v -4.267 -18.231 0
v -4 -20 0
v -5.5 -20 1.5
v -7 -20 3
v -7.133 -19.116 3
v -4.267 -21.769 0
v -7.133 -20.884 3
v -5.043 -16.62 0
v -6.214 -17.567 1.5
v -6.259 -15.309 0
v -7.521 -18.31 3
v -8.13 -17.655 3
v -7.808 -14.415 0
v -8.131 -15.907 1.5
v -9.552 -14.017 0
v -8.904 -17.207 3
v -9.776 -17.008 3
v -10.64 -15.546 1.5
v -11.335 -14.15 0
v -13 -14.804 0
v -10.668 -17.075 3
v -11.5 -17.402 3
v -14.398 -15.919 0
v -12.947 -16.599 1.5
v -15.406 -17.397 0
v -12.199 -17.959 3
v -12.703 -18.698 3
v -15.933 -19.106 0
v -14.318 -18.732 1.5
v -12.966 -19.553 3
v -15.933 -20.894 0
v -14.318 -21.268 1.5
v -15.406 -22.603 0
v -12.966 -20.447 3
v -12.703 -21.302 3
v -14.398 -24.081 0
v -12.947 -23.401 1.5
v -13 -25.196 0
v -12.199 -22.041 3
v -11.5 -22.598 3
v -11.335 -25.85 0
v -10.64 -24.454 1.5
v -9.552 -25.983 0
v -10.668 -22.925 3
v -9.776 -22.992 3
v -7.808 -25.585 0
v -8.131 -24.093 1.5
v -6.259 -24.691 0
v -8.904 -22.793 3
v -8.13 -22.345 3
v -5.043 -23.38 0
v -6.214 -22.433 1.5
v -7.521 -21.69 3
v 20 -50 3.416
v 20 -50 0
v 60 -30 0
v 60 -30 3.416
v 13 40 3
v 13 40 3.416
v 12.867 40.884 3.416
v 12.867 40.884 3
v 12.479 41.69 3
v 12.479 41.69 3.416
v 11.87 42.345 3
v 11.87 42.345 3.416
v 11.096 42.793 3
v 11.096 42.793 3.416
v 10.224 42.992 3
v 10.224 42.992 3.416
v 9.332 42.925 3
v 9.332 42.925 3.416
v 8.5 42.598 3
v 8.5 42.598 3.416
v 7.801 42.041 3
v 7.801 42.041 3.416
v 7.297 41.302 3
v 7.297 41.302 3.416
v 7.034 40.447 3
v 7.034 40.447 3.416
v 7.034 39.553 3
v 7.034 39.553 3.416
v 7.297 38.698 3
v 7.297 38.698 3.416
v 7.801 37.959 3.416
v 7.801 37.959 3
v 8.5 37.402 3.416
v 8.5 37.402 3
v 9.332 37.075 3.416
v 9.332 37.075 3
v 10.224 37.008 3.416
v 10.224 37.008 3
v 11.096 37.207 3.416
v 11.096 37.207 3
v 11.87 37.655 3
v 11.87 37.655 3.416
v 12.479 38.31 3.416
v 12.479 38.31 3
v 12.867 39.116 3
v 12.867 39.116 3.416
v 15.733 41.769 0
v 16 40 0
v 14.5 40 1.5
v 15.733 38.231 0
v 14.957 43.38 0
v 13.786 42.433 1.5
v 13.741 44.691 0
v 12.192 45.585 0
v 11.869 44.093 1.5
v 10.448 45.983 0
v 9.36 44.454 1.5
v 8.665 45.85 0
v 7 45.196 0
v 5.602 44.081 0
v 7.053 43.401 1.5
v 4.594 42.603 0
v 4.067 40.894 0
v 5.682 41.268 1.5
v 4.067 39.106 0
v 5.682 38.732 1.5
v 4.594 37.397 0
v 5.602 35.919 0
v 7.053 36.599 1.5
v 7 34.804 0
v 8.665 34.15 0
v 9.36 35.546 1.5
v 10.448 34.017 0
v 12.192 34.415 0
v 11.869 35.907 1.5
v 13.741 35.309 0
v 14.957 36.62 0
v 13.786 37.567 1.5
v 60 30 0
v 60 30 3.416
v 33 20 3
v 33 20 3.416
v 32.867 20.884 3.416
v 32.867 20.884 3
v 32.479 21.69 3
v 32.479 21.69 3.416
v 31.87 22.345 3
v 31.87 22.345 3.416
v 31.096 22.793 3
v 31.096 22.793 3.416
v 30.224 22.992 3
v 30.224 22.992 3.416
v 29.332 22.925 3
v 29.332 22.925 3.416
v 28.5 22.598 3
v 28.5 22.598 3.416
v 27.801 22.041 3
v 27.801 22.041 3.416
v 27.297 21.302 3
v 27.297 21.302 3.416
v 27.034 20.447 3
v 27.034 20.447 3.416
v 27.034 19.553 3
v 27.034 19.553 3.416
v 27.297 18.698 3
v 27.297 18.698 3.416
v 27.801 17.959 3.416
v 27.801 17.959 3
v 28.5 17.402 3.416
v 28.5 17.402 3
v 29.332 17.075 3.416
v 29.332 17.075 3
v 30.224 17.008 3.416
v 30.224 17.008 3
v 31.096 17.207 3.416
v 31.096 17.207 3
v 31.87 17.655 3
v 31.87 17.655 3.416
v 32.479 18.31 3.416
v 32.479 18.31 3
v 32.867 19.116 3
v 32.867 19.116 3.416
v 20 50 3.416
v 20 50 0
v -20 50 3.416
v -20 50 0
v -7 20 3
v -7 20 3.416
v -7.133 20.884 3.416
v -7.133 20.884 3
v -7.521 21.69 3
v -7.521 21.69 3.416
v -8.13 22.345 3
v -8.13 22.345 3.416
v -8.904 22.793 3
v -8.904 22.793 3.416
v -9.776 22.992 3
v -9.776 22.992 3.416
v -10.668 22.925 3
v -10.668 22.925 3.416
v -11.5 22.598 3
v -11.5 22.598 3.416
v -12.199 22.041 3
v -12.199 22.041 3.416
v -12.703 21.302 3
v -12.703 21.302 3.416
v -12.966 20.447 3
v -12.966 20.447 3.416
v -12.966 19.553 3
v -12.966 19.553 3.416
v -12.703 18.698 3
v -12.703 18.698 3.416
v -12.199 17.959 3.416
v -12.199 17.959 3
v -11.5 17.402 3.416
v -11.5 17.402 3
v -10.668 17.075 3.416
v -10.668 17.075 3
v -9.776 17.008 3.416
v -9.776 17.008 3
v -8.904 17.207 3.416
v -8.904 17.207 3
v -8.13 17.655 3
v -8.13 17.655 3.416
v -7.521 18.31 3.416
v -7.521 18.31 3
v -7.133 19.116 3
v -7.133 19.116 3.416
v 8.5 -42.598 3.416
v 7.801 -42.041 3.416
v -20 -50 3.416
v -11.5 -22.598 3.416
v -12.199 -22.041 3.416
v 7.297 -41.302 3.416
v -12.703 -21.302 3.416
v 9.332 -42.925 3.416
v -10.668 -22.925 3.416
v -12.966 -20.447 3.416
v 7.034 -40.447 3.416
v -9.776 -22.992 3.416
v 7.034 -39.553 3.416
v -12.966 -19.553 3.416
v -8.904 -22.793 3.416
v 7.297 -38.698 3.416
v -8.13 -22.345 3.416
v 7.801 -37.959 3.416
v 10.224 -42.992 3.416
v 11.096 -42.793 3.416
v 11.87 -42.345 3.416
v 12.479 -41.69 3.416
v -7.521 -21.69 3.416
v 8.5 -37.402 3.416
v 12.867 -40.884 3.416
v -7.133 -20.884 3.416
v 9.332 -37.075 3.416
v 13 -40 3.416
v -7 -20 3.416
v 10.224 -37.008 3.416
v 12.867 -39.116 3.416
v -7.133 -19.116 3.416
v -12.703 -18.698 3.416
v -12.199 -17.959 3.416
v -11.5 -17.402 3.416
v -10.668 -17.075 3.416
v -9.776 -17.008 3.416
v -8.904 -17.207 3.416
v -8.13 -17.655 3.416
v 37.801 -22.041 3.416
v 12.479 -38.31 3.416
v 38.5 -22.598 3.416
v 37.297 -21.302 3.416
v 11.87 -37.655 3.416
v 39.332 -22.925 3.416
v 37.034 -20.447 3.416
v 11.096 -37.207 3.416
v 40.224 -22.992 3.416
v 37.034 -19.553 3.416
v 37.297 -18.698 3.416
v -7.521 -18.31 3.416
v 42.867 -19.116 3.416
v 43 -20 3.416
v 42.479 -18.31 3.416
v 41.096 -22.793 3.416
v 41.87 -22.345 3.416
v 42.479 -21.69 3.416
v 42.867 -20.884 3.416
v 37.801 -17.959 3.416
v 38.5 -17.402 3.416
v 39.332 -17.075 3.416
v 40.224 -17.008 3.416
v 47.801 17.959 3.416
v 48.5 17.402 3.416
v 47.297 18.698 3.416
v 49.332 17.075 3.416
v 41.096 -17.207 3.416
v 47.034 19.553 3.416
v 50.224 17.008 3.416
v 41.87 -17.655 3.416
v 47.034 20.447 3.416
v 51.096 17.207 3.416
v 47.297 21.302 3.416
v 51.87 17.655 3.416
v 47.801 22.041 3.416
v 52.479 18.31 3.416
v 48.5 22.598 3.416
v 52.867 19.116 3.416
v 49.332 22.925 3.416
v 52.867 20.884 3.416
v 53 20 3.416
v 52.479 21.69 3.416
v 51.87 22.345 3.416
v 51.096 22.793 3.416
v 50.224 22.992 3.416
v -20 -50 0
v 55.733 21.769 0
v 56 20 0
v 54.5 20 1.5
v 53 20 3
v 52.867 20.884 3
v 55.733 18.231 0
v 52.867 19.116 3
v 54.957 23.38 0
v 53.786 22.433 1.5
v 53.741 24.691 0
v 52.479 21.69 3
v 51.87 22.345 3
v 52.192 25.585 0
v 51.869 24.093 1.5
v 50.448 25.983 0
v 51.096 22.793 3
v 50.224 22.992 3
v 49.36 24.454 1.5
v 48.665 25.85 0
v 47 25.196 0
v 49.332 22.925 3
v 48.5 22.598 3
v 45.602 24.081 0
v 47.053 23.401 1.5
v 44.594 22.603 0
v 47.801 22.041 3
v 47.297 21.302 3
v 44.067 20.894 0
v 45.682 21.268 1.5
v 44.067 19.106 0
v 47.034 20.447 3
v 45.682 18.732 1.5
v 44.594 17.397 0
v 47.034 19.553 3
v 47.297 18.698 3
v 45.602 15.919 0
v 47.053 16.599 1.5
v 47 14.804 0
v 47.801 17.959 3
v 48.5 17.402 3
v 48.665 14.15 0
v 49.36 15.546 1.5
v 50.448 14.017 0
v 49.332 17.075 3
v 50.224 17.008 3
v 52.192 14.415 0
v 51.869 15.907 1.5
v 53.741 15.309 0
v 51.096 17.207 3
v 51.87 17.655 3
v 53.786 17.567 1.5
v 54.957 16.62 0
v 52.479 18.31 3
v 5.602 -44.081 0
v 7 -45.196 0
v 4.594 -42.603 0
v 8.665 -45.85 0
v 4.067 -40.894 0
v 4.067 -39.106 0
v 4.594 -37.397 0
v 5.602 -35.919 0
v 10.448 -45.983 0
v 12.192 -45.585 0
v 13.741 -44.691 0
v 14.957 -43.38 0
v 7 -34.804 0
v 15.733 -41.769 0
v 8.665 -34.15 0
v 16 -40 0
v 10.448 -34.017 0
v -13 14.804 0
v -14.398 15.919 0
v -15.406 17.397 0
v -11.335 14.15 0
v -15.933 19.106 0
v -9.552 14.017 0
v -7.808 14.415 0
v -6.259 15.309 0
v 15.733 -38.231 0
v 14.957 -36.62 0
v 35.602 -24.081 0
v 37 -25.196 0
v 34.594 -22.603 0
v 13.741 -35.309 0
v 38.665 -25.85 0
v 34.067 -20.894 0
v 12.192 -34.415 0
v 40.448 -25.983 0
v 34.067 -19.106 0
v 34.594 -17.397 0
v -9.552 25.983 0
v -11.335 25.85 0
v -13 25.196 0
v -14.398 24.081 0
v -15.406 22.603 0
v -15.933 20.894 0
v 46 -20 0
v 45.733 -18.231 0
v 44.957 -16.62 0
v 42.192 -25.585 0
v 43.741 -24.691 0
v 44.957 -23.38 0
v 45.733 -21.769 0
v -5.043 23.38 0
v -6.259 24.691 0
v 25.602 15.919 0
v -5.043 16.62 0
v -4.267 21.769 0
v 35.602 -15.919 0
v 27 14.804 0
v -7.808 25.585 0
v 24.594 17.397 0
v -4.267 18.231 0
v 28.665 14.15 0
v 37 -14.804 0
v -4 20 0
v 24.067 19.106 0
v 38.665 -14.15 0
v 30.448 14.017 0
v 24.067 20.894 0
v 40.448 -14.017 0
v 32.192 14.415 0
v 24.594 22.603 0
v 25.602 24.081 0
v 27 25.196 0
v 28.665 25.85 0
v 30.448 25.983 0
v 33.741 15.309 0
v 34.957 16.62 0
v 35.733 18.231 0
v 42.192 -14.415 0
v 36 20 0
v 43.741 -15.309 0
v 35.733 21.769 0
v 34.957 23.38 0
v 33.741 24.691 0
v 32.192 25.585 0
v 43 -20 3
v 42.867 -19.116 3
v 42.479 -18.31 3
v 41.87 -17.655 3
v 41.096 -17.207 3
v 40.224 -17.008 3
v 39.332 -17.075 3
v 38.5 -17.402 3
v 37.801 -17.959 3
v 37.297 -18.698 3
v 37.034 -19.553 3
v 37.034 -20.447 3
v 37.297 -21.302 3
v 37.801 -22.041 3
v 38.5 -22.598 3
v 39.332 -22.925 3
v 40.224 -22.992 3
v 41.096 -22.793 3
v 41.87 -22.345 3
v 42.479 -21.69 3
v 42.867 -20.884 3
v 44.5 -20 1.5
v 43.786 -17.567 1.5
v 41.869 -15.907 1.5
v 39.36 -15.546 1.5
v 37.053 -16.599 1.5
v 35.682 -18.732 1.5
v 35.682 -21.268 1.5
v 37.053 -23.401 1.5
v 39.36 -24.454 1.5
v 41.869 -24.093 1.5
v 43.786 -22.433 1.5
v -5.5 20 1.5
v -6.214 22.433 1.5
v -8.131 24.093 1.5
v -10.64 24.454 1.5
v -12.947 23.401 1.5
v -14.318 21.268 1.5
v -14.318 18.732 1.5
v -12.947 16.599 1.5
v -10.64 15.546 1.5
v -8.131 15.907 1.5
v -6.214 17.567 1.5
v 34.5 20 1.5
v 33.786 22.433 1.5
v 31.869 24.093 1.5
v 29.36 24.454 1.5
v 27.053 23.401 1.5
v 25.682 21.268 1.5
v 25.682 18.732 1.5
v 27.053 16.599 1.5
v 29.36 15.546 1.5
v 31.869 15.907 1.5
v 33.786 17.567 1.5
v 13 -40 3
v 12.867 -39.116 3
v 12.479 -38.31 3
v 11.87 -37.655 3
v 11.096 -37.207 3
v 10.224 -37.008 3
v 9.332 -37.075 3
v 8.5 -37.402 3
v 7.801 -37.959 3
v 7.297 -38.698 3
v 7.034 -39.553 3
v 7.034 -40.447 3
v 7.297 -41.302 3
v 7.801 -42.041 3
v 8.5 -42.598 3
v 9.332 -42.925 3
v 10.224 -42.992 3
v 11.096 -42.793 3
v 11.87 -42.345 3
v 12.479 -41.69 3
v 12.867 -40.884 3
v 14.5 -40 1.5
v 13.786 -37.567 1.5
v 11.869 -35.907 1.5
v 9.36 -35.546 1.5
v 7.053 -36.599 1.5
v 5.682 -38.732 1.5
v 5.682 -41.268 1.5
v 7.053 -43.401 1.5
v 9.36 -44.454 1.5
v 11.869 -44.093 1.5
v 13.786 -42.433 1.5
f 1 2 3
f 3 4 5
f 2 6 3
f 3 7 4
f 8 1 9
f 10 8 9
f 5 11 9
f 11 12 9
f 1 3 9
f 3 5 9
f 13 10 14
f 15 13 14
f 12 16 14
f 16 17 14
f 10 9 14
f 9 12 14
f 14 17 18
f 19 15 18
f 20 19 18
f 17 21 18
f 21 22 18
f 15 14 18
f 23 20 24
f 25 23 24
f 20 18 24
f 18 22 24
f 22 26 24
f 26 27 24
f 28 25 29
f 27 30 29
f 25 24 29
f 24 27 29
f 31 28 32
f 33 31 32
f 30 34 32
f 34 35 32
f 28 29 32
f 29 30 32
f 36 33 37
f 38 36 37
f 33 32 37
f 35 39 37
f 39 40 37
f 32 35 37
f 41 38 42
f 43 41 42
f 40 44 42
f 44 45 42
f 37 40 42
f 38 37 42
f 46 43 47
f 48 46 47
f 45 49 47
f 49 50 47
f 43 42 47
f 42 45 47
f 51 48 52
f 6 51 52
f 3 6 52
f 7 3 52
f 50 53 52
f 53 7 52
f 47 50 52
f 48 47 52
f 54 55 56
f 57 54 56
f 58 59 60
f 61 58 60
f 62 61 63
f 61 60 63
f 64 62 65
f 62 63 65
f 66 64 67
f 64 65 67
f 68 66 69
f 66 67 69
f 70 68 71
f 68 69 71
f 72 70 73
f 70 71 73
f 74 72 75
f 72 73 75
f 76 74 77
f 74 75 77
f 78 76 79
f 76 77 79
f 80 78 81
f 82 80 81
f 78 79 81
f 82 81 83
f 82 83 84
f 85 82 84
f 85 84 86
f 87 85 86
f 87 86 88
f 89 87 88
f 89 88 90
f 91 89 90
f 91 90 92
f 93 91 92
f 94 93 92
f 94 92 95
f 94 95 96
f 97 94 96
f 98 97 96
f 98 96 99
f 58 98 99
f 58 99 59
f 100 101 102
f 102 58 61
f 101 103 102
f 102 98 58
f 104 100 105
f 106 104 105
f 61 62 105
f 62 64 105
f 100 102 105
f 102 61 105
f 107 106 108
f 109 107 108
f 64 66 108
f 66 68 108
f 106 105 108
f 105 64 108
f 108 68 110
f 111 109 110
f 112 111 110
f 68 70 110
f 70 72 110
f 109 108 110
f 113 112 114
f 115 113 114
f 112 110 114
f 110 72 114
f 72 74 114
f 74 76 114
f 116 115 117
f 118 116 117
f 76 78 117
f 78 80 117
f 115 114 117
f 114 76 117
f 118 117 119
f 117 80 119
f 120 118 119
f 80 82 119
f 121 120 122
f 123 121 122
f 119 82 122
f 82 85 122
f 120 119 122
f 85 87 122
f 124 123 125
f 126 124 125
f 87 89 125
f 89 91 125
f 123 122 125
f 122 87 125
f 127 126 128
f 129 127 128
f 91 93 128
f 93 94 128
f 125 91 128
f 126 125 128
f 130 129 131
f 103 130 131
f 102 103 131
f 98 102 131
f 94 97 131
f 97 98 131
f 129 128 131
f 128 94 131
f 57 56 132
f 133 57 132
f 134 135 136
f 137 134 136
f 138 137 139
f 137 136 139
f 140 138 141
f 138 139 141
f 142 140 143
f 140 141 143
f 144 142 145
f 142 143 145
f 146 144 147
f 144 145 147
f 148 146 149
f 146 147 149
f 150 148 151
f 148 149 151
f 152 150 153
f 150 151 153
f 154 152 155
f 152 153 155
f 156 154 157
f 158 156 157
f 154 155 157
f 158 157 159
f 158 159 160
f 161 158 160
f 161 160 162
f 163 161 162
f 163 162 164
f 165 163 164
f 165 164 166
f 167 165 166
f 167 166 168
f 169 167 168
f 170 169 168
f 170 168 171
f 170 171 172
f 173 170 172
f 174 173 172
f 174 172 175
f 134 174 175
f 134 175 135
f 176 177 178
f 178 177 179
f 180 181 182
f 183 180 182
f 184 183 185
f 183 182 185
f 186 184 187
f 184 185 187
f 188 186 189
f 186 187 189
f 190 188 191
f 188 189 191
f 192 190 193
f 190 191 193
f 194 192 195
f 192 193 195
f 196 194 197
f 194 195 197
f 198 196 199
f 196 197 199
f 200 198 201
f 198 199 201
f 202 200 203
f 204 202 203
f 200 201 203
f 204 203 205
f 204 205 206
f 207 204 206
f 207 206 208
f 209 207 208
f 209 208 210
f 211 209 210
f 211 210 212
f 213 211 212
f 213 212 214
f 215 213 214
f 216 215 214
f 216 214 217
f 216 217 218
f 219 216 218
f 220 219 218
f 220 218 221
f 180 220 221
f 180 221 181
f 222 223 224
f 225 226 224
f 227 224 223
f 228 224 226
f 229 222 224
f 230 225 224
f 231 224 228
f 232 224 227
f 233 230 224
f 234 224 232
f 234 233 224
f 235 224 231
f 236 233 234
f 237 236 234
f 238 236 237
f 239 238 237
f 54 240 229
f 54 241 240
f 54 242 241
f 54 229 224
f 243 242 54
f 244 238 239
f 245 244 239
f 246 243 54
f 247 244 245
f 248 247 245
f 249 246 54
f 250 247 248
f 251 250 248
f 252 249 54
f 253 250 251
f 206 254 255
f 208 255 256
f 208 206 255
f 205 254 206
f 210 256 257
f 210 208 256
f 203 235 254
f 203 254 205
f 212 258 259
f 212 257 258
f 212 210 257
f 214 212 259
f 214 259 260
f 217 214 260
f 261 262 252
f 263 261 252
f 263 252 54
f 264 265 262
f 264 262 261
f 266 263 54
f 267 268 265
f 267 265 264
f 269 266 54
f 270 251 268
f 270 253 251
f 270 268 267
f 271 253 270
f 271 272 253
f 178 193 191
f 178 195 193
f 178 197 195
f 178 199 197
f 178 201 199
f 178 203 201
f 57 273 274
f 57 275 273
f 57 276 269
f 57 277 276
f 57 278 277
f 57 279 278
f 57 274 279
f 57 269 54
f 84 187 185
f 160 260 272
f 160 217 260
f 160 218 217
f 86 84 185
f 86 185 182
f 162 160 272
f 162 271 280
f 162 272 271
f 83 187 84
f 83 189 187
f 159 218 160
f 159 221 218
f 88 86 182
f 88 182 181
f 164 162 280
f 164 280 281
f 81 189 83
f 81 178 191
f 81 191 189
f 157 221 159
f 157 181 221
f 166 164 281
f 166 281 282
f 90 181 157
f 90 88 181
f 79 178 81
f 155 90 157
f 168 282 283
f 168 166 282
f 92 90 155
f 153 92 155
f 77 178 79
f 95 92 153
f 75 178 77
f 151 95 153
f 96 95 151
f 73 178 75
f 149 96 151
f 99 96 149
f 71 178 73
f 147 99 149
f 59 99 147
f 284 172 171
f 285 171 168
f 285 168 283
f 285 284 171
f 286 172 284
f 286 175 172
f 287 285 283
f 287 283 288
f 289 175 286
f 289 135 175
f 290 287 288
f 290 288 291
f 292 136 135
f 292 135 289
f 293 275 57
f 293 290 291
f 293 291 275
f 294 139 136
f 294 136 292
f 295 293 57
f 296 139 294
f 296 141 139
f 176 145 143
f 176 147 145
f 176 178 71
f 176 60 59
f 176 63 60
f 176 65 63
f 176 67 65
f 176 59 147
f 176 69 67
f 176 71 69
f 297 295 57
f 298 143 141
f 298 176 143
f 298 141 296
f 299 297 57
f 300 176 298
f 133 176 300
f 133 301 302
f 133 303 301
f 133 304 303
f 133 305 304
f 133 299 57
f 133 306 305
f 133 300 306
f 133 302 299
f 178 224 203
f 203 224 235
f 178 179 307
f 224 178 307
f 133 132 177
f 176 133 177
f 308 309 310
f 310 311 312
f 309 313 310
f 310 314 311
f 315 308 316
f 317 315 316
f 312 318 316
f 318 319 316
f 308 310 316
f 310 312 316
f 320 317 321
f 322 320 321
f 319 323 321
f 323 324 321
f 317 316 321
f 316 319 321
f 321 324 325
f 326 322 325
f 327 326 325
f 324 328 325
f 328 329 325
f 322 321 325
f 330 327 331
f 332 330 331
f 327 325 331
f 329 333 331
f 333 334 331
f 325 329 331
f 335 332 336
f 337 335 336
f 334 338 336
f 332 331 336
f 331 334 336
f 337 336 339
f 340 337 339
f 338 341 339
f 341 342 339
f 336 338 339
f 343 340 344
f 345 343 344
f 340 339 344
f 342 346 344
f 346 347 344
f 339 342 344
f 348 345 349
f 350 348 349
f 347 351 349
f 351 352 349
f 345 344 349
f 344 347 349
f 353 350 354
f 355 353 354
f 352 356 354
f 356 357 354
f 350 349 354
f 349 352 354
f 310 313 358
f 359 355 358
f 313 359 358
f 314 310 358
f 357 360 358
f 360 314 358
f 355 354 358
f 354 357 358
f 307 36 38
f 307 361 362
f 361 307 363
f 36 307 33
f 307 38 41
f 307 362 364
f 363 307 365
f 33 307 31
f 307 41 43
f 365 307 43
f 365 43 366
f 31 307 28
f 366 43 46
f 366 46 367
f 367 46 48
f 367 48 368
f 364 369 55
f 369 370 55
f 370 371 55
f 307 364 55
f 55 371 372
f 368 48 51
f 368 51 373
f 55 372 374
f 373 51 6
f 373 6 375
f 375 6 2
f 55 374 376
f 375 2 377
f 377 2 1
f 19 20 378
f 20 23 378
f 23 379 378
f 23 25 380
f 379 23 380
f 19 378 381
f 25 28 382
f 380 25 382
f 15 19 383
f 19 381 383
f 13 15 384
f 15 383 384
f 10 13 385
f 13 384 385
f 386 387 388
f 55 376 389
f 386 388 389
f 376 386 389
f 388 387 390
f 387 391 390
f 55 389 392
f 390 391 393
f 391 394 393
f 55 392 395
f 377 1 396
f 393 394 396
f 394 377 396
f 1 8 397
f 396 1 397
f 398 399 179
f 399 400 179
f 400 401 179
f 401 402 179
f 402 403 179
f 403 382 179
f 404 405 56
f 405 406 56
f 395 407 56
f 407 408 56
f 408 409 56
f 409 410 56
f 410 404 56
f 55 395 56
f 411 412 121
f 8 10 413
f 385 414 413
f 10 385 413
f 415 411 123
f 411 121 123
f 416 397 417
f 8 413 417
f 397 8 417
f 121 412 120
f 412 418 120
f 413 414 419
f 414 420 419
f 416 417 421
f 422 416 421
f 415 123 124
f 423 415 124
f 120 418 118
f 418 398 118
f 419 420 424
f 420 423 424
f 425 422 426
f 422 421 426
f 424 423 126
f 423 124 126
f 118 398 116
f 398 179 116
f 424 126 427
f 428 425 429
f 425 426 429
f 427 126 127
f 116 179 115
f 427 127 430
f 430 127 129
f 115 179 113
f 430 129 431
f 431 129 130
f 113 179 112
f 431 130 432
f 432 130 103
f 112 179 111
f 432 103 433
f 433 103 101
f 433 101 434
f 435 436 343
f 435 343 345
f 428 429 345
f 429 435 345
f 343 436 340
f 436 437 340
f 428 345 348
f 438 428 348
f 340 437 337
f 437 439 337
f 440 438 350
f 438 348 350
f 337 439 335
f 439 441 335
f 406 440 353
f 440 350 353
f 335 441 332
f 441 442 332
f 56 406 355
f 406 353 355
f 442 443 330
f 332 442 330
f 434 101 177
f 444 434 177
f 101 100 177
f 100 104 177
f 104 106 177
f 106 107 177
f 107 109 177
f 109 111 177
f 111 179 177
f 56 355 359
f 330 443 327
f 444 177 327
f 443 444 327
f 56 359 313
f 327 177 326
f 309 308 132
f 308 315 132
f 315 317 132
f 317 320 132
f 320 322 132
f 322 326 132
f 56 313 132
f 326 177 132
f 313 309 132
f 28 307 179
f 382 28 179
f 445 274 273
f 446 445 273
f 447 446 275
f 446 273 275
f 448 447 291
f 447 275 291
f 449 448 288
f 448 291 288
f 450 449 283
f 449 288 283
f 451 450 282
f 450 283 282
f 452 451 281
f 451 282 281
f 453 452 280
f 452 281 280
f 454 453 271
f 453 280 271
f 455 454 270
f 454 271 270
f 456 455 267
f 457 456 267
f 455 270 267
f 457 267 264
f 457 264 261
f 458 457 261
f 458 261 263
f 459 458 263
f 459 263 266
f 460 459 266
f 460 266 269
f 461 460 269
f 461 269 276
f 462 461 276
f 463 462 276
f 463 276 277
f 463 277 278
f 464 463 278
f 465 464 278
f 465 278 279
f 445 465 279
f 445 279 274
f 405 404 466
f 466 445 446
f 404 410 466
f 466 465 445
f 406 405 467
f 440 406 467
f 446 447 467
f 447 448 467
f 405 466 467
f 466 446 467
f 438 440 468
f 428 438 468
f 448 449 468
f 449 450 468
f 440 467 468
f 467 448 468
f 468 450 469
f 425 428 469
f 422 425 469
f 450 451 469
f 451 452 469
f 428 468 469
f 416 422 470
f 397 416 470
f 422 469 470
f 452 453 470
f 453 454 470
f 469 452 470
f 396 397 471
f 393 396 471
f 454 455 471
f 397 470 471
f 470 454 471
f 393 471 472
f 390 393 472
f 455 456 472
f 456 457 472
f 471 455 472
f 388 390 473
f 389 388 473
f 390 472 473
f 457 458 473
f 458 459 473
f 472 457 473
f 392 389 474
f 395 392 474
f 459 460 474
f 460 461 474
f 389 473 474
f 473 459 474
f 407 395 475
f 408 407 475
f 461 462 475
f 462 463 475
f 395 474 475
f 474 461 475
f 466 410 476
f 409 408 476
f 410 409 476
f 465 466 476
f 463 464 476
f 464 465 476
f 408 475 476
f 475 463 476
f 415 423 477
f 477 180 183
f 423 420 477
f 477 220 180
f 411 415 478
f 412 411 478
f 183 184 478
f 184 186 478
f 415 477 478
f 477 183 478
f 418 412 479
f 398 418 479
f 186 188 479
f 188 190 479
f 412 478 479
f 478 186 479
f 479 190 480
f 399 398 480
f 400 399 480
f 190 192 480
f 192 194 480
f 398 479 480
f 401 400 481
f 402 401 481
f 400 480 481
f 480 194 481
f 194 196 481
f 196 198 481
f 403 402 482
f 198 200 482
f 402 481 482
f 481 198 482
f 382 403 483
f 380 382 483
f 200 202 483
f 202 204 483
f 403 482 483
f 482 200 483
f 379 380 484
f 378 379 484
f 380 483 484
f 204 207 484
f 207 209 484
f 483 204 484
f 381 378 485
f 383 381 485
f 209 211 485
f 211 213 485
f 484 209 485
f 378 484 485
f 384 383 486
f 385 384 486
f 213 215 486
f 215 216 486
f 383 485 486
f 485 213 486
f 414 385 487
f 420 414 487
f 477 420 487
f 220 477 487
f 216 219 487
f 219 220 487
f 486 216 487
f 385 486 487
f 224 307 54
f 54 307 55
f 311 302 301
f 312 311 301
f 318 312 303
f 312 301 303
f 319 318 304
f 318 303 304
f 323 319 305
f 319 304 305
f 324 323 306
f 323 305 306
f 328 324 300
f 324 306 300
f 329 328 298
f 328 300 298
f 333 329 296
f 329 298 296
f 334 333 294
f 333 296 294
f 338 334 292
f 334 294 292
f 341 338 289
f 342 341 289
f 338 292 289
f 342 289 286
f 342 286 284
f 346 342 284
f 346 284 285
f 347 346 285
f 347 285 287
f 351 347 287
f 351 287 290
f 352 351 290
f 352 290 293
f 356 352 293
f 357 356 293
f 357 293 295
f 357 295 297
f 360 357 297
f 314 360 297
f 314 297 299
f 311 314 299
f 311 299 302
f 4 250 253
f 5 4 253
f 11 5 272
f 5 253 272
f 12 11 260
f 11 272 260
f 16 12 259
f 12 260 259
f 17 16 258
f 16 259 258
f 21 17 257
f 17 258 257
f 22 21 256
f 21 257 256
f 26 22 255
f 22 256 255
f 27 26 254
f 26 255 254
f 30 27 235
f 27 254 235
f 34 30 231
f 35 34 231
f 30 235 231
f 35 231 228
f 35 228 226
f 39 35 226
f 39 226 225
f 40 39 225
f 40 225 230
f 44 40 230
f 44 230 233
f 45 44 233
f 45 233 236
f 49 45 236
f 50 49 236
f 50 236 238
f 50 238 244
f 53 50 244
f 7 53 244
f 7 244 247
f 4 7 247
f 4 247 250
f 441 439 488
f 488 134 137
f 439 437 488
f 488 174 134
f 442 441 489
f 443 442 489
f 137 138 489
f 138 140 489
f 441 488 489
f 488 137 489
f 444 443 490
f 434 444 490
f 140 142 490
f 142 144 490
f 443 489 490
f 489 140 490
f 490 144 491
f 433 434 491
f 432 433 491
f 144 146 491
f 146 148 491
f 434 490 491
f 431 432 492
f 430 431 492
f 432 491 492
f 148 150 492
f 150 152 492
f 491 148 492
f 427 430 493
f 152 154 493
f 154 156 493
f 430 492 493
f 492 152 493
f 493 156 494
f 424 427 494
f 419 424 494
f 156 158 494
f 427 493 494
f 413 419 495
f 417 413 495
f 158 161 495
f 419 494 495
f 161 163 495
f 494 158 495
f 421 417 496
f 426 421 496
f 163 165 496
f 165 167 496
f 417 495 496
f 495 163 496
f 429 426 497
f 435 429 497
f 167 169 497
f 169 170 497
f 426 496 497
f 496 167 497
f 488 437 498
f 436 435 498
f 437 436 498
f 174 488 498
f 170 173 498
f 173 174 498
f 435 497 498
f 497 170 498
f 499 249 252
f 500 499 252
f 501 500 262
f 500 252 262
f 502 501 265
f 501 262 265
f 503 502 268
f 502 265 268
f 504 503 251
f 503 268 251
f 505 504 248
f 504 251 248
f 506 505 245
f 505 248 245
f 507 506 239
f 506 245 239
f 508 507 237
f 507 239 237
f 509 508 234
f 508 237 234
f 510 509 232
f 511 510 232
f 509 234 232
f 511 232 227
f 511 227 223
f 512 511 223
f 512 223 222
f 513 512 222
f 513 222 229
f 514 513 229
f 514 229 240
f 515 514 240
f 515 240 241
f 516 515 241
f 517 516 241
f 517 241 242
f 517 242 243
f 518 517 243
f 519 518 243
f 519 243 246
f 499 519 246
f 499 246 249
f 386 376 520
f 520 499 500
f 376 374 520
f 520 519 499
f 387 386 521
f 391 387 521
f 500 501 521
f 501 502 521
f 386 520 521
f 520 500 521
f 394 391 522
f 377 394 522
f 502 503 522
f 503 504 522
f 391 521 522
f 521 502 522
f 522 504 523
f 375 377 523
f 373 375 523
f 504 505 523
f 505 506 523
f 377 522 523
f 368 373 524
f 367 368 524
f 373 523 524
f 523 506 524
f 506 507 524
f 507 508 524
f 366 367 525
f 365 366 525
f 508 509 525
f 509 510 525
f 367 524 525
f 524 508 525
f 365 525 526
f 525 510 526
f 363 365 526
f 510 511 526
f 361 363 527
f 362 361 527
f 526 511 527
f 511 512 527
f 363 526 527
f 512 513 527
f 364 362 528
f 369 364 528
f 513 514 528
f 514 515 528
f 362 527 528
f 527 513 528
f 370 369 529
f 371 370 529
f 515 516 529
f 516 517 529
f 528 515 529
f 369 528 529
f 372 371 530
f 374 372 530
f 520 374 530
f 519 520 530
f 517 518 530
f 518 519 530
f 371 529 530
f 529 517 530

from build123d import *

# Parameters (mm, degrees)
BOSS_EXTRUDE1_DEPTH = 3.416
SKETCH2_R           = 3
CUT_EXTRUDE1_DEPTH  = 4.416
CHAMFER1_SIZE       = 3


with BuildPart() as part:
    # Sketch1 → Boss-Extrude1 (new body)
    with BuildSketch(Plane.XY):
        Polygon((-20, -50), (20, -50), (60, -30), (60, 30), (20, 50), (-20, 50), align=None)
    extrude(amount=BOSS_EXTRUDE1_DEPTH)

    # Sketch2 → Cut-Extrude1 (cut, through all)
    with BuildSketch(Plane.XY.offset(3.416)):
        with Locations((-10, 20)):
            Circle(SKETCH2_R)
        with Locations((10, 40)):
            Circle(SKETCH2_R)
        with Locations((30, 20)):
            Circle(SKETCH2_R)
        with Locations((50, 20)):
            Circle(SKETCH2_R)
        with Locations((-10, -20)):
            Circle(SKETCH2_R)
        with Locations((10, -40)):
            Circle(SKETCH2_R)
        with Locations((40, -20)):
            Circle(SKETCH2_R)
    extrude(amount=-CUT_EXTRUDE1_DEPTH, mode=Mode.SUBTRACT)

    # Chamfer1
    chamfer1_edges = [part.edges().sort_by_distance(p)[0] for p in [
        (-13, -20, 0),
        (47, 20, 0),
        (27, 20, 0),
        (7, 40, 0),
        (7, -40, 0),
        (37, -20, 0),
        (-13, 20, 0),
    ]]
    chamfer(chamfer1_edges, length=CHAMFER1_SIZE)


solid = part.part
